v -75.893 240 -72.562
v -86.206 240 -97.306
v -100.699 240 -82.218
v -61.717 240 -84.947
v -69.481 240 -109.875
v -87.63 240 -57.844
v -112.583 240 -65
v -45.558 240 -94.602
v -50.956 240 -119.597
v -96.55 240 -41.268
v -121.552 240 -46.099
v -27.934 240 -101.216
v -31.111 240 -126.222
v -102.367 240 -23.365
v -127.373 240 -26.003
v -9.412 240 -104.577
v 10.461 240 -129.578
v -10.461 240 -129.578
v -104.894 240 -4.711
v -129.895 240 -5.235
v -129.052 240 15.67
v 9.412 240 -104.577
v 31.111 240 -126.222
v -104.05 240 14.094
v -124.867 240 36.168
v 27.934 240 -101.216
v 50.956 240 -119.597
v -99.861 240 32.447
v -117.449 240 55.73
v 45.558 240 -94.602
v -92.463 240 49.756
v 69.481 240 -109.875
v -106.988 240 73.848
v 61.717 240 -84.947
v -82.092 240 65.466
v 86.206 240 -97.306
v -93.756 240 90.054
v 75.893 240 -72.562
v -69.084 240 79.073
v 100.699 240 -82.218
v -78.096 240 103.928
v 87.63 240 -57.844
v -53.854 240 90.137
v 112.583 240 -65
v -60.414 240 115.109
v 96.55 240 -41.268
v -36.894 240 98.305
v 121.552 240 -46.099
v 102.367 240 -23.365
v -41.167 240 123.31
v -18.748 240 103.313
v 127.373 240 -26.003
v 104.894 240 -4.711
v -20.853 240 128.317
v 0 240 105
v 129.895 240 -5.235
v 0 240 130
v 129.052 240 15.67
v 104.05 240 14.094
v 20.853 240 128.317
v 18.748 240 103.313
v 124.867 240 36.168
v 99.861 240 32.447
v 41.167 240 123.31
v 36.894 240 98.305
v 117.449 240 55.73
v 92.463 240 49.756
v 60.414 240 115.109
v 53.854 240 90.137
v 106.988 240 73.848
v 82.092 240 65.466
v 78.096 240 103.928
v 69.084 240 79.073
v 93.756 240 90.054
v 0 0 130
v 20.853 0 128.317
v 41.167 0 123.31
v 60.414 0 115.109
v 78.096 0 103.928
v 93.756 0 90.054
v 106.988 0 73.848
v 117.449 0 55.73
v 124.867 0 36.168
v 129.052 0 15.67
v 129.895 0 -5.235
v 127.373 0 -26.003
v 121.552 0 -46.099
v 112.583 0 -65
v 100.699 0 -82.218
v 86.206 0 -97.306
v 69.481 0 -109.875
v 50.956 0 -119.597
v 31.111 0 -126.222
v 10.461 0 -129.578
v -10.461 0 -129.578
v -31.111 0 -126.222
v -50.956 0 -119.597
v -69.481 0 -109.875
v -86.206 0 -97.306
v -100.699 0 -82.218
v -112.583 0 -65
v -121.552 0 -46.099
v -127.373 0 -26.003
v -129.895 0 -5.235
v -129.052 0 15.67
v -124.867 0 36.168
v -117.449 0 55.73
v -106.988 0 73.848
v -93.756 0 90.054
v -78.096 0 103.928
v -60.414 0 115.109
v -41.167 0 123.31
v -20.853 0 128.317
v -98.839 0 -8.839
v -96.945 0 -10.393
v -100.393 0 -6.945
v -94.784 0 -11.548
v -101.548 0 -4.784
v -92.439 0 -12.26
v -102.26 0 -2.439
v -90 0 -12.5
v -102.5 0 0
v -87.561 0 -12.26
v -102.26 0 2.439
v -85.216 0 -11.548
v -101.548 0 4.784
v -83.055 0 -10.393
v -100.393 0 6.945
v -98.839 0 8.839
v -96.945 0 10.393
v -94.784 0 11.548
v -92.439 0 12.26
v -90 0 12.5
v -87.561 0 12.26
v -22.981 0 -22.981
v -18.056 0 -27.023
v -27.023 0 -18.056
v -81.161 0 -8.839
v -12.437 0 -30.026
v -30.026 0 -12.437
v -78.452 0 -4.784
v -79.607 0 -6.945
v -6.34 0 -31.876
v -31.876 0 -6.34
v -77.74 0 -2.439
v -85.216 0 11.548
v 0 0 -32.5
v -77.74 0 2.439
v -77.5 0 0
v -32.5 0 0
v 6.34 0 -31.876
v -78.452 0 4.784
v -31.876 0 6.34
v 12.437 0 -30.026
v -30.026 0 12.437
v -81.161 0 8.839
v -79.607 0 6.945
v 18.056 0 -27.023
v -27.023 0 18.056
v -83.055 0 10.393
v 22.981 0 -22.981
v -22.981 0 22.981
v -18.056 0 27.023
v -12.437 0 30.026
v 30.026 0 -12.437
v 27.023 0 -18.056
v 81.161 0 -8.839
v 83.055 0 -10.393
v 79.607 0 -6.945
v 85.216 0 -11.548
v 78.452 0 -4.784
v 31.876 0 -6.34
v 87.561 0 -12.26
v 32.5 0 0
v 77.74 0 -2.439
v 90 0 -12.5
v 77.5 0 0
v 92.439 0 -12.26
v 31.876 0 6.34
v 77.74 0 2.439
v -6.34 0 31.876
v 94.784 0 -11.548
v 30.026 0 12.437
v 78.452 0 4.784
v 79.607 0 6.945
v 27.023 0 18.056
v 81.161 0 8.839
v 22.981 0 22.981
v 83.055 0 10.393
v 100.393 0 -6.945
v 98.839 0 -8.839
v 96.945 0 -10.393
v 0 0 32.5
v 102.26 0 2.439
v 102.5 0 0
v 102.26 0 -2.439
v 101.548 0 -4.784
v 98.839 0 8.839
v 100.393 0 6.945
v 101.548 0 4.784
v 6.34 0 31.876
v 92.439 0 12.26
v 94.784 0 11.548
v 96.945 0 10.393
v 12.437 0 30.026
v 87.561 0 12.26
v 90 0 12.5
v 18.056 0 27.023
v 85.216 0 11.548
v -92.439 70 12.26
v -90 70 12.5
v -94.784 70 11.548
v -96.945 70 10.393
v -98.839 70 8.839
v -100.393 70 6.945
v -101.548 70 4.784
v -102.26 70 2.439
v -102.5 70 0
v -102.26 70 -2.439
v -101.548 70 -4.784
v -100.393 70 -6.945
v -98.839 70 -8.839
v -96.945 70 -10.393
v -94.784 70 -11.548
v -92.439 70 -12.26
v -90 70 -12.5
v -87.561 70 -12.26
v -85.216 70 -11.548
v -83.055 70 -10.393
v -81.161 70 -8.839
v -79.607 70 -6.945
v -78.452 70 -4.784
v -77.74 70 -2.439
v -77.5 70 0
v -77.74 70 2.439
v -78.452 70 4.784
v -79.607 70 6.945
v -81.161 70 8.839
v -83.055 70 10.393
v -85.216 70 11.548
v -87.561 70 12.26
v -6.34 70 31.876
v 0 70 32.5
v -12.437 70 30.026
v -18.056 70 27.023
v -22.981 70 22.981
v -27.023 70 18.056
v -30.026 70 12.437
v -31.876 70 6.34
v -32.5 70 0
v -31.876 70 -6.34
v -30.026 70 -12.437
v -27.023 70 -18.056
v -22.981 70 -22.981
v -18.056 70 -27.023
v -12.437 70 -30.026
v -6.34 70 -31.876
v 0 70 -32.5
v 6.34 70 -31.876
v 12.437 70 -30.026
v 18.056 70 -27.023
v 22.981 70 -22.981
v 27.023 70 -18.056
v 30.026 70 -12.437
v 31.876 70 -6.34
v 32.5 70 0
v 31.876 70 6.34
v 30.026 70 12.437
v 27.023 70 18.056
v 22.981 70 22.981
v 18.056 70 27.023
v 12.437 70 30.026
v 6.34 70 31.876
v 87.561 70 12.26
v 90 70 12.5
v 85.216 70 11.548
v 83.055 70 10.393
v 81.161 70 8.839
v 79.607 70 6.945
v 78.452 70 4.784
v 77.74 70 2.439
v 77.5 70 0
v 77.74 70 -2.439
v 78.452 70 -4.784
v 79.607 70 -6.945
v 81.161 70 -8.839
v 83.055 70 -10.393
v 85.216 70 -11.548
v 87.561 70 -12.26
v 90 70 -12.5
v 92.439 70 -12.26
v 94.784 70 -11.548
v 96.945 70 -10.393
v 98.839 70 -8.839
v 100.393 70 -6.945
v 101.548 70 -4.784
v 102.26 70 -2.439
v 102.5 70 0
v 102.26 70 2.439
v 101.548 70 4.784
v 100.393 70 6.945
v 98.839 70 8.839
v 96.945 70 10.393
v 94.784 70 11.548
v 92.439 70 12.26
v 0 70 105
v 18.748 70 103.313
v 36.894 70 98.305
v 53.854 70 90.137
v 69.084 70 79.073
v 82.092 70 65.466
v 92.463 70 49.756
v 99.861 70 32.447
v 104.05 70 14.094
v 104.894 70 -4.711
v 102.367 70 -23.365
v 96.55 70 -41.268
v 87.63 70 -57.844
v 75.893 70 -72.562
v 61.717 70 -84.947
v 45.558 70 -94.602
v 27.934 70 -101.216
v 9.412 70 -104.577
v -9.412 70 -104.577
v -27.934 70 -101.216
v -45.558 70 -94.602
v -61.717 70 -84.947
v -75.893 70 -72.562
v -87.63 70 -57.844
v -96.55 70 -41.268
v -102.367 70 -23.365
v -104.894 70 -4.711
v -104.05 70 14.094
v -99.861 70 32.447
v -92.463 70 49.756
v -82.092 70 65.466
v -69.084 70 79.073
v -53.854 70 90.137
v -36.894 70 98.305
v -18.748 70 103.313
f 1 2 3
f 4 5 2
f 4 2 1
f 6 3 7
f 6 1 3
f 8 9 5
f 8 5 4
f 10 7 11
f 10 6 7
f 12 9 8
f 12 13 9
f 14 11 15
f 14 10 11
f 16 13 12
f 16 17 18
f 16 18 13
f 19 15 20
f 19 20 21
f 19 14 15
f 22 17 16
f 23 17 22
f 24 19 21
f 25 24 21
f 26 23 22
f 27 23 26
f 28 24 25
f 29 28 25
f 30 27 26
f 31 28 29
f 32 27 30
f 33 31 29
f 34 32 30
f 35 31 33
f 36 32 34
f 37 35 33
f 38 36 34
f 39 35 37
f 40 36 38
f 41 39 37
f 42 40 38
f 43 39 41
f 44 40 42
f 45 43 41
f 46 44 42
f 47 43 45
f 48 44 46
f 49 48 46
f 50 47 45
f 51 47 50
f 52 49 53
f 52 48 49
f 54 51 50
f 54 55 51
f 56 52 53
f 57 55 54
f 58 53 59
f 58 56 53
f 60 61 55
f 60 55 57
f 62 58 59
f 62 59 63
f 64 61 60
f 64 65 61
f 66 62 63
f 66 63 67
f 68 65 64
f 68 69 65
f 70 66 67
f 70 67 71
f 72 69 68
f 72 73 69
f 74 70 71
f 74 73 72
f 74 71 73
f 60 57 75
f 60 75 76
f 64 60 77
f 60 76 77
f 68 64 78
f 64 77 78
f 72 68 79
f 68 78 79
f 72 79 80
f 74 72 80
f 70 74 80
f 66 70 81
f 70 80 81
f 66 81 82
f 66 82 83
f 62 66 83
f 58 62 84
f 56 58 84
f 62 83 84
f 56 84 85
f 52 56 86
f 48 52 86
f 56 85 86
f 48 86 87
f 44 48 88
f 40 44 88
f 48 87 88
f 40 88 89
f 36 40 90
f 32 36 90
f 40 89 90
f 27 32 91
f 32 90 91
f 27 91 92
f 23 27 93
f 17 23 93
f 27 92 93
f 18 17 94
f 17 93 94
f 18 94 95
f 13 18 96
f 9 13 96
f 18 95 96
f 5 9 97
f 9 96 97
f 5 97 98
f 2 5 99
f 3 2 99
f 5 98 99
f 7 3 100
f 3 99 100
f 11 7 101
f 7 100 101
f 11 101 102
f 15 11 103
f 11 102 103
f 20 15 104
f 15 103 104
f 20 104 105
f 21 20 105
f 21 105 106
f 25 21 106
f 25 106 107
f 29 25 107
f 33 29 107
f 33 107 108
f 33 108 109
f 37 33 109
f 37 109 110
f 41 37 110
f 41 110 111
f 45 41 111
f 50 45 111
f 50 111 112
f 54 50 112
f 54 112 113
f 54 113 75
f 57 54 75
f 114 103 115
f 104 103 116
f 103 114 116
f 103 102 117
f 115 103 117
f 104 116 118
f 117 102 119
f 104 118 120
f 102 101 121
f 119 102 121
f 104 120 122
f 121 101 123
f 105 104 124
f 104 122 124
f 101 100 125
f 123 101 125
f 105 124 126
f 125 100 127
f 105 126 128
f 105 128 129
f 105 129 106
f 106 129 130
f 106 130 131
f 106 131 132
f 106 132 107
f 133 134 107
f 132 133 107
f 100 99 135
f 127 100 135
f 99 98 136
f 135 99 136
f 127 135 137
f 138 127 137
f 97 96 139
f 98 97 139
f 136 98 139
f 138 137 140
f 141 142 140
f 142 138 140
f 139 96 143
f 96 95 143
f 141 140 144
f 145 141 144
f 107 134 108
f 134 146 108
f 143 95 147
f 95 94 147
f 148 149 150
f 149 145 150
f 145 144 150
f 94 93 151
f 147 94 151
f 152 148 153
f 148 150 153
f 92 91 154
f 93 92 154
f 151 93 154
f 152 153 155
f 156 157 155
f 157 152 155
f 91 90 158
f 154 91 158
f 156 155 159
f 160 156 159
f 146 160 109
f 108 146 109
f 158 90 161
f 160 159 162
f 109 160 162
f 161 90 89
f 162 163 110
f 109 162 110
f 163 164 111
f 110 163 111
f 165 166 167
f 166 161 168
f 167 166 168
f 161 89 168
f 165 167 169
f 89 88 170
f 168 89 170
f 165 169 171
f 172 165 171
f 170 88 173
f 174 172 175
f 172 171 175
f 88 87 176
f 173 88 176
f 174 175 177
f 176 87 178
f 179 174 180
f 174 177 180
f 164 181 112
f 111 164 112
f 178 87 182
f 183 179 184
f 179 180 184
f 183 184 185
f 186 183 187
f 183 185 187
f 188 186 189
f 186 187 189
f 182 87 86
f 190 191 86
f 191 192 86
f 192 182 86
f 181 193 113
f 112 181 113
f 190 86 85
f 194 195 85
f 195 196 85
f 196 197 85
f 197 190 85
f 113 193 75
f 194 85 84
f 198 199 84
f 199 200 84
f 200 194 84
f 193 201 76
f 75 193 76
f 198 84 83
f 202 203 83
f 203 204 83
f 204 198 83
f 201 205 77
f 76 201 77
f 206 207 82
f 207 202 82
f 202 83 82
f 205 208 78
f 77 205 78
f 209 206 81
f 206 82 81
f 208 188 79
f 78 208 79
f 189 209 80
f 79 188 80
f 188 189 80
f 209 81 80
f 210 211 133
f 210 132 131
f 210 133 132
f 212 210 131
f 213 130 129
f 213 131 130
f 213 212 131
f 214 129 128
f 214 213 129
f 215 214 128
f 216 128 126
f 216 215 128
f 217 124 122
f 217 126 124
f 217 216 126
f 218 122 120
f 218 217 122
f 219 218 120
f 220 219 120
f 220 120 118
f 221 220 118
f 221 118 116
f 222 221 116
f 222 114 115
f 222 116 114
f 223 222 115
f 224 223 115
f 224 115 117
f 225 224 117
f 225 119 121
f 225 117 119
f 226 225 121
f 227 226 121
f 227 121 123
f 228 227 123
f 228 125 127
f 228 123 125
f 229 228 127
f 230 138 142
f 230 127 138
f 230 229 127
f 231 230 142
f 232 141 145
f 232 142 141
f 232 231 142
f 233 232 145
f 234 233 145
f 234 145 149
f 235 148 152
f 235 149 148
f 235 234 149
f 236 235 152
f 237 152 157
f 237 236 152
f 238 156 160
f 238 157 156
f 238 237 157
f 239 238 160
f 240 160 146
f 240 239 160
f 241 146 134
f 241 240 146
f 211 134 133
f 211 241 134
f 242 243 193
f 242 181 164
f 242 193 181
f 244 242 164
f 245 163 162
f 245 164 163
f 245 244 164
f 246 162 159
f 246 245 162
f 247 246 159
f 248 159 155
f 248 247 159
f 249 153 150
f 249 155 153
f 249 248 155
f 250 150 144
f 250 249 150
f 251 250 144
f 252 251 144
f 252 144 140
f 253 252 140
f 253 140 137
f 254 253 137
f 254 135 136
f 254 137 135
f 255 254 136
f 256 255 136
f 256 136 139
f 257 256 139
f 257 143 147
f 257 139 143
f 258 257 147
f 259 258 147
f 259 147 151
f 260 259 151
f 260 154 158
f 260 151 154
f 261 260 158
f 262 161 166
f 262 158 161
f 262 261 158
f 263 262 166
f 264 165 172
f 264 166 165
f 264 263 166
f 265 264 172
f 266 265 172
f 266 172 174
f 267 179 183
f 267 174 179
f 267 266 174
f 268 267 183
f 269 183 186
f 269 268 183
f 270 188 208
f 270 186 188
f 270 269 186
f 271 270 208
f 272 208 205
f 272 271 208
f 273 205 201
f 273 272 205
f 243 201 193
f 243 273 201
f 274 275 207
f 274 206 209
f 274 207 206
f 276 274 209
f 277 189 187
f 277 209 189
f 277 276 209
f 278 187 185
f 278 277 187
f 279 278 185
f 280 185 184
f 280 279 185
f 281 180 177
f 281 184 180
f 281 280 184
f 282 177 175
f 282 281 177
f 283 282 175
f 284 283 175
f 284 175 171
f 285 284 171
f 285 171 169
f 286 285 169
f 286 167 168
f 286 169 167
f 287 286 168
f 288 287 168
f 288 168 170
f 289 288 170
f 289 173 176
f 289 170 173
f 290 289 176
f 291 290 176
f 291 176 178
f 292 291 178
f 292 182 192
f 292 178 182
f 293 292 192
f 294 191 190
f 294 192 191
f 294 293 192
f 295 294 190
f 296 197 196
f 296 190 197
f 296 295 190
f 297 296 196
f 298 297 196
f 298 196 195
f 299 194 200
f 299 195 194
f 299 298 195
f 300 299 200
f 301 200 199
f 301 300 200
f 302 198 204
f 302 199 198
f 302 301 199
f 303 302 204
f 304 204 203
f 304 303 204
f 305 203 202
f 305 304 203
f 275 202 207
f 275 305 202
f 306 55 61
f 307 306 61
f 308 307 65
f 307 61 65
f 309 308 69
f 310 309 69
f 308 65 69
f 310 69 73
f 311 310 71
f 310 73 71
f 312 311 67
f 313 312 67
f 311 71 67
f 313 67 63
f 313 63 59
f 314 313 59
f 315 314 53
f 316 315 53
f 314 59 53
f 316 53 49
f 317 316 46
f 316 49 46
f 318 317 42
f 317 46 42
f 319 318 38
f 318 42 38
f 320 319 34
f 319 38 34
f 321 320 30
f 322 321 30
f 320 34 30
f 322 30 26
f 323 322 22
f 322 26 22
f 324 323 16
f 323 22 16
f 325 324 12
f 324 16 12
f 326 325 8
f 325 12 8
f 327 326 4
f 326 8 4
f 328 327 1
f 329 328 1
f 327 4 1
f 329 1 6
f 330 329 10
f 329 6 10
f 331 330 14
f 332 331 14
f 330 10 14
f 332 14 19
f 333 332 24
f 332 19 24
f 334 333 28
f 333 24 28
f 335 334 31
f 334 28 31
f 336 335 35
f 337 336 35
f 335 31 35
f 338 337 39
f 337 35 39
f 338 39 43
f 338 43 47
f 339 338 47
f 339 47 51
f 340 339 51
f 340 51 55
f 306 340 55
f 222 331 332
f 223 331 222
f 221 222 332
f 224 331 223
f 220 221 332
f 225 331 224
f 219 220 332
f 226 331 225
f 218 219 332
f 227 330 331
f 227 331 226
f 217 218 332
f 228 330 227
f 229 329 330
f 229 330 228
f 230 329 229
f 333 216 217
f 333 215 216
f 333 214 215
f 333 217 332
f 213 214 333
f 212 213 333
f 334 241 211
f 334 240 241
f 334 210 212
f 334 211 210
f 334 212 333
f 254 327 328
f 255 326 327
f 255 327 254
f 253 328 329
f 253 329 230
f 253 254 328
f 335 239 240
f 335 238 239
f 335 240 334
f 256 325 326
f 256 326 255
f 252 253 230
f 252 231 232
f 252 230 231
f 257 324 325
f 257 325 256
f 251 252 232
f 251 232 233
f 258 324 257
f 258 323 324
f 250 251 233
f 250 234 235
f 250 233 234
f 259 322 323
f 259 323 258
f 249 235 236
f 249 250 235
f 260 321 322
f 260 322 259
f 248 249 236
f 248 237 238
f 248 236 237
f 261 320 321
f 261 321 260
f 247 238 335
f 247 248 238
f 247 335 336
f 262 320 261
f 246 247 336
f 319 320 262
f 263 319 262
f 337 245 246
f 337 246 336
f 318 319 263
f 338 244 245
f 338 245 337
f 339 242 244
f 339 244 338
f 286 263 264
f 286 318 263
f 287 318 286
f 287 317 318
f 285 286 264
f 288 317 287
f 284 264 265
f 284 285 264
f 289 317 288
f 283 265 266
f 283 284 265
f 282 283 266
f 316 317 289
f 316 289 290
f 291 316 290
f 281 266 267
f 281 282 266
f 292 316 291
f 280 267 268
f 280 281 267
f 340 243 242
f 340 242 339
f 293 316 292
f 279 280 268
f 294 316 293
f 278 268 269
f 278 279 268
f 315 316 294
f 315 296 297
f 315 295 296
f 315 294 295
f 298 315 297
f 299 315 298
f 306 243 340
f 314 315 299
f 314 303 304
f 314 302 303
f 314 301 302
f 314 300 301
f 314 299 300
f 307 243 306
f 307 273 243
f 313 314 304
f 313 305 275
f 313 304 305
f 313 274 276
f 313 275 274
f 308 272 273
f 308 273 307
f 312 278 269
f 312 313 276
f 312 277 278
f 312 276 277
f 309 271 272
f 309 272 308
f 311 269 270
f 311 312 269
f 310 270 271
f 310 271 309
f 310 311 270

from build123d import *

# Parameters (mm, degrees)
SKETCH1_R               = 130
BOSS_EXTRUDE1_DEPTH     = 240
SKETCH2_R               = 105
CUT_EXTRUDE1_DEPTH      = 170
CUT_EXTRUDE2_DEPTH      = 303.324329157
CUT_EXTRUDE2_DEPTH_BACK = 303.324329157
SKETCH3_R               = 12.5
SKETCH3_R_2             = 32.5


with BuildPart() as part:
    # Sketch1 → Boss-Extrude1 (new body)
    with BuildSketch(Plane(origin=(0, 0, 0), x_dir=(1, 0, 0), z_dir=(0, 1, 0))):
        with Locations(Location((0, 0, 0), (0, 0, 270))):
            Circle(SKETCH1_R)
    extrude(amount=BOSS_EXTRUDE1_DEPTH)

    # Sketch2 → Cut-Extrude1 (cut)
    with BuildSketch(Plane(origin=(0, 240, 0), x_dir=(1, 0, 0), z_dir=(0, 1, 0))):
        with Locations(Location((0, 0, 0), (0, 0, 270))):
            Circle(SKETCH2_R)
    extrude(amount=-CUT_EXTRUDE1_DEPTH, mode=Mode.SUBTRACT)

    # Sketch3 → Cut-Extrude2 (cut, two sides: drawn at the far end of the back side and taken through both)
    with BuildSketch(Plane.XZ.offset(-CUT_EXTRUDE2_DEPTH_BACK)):
        with Locations(Location((-90, 0, 0), (0, 0, 90))):
            Circle(SKETCH3_R)
        with Locations(Location((90, 0, 0), (0, 0, 90))):
            Circle(SKETCH3_R)
        with Locations(Location((0, 0, 0), (0, 0, 90))):
            Circle(SKETCH3_R_2)
    extrude(amount=CUT_EXTRUDE2_DEPTH + CUT_EXTRUDE2_DEPTH_BACK, mode=Mode.SUBTRACT)


solid = part.part
